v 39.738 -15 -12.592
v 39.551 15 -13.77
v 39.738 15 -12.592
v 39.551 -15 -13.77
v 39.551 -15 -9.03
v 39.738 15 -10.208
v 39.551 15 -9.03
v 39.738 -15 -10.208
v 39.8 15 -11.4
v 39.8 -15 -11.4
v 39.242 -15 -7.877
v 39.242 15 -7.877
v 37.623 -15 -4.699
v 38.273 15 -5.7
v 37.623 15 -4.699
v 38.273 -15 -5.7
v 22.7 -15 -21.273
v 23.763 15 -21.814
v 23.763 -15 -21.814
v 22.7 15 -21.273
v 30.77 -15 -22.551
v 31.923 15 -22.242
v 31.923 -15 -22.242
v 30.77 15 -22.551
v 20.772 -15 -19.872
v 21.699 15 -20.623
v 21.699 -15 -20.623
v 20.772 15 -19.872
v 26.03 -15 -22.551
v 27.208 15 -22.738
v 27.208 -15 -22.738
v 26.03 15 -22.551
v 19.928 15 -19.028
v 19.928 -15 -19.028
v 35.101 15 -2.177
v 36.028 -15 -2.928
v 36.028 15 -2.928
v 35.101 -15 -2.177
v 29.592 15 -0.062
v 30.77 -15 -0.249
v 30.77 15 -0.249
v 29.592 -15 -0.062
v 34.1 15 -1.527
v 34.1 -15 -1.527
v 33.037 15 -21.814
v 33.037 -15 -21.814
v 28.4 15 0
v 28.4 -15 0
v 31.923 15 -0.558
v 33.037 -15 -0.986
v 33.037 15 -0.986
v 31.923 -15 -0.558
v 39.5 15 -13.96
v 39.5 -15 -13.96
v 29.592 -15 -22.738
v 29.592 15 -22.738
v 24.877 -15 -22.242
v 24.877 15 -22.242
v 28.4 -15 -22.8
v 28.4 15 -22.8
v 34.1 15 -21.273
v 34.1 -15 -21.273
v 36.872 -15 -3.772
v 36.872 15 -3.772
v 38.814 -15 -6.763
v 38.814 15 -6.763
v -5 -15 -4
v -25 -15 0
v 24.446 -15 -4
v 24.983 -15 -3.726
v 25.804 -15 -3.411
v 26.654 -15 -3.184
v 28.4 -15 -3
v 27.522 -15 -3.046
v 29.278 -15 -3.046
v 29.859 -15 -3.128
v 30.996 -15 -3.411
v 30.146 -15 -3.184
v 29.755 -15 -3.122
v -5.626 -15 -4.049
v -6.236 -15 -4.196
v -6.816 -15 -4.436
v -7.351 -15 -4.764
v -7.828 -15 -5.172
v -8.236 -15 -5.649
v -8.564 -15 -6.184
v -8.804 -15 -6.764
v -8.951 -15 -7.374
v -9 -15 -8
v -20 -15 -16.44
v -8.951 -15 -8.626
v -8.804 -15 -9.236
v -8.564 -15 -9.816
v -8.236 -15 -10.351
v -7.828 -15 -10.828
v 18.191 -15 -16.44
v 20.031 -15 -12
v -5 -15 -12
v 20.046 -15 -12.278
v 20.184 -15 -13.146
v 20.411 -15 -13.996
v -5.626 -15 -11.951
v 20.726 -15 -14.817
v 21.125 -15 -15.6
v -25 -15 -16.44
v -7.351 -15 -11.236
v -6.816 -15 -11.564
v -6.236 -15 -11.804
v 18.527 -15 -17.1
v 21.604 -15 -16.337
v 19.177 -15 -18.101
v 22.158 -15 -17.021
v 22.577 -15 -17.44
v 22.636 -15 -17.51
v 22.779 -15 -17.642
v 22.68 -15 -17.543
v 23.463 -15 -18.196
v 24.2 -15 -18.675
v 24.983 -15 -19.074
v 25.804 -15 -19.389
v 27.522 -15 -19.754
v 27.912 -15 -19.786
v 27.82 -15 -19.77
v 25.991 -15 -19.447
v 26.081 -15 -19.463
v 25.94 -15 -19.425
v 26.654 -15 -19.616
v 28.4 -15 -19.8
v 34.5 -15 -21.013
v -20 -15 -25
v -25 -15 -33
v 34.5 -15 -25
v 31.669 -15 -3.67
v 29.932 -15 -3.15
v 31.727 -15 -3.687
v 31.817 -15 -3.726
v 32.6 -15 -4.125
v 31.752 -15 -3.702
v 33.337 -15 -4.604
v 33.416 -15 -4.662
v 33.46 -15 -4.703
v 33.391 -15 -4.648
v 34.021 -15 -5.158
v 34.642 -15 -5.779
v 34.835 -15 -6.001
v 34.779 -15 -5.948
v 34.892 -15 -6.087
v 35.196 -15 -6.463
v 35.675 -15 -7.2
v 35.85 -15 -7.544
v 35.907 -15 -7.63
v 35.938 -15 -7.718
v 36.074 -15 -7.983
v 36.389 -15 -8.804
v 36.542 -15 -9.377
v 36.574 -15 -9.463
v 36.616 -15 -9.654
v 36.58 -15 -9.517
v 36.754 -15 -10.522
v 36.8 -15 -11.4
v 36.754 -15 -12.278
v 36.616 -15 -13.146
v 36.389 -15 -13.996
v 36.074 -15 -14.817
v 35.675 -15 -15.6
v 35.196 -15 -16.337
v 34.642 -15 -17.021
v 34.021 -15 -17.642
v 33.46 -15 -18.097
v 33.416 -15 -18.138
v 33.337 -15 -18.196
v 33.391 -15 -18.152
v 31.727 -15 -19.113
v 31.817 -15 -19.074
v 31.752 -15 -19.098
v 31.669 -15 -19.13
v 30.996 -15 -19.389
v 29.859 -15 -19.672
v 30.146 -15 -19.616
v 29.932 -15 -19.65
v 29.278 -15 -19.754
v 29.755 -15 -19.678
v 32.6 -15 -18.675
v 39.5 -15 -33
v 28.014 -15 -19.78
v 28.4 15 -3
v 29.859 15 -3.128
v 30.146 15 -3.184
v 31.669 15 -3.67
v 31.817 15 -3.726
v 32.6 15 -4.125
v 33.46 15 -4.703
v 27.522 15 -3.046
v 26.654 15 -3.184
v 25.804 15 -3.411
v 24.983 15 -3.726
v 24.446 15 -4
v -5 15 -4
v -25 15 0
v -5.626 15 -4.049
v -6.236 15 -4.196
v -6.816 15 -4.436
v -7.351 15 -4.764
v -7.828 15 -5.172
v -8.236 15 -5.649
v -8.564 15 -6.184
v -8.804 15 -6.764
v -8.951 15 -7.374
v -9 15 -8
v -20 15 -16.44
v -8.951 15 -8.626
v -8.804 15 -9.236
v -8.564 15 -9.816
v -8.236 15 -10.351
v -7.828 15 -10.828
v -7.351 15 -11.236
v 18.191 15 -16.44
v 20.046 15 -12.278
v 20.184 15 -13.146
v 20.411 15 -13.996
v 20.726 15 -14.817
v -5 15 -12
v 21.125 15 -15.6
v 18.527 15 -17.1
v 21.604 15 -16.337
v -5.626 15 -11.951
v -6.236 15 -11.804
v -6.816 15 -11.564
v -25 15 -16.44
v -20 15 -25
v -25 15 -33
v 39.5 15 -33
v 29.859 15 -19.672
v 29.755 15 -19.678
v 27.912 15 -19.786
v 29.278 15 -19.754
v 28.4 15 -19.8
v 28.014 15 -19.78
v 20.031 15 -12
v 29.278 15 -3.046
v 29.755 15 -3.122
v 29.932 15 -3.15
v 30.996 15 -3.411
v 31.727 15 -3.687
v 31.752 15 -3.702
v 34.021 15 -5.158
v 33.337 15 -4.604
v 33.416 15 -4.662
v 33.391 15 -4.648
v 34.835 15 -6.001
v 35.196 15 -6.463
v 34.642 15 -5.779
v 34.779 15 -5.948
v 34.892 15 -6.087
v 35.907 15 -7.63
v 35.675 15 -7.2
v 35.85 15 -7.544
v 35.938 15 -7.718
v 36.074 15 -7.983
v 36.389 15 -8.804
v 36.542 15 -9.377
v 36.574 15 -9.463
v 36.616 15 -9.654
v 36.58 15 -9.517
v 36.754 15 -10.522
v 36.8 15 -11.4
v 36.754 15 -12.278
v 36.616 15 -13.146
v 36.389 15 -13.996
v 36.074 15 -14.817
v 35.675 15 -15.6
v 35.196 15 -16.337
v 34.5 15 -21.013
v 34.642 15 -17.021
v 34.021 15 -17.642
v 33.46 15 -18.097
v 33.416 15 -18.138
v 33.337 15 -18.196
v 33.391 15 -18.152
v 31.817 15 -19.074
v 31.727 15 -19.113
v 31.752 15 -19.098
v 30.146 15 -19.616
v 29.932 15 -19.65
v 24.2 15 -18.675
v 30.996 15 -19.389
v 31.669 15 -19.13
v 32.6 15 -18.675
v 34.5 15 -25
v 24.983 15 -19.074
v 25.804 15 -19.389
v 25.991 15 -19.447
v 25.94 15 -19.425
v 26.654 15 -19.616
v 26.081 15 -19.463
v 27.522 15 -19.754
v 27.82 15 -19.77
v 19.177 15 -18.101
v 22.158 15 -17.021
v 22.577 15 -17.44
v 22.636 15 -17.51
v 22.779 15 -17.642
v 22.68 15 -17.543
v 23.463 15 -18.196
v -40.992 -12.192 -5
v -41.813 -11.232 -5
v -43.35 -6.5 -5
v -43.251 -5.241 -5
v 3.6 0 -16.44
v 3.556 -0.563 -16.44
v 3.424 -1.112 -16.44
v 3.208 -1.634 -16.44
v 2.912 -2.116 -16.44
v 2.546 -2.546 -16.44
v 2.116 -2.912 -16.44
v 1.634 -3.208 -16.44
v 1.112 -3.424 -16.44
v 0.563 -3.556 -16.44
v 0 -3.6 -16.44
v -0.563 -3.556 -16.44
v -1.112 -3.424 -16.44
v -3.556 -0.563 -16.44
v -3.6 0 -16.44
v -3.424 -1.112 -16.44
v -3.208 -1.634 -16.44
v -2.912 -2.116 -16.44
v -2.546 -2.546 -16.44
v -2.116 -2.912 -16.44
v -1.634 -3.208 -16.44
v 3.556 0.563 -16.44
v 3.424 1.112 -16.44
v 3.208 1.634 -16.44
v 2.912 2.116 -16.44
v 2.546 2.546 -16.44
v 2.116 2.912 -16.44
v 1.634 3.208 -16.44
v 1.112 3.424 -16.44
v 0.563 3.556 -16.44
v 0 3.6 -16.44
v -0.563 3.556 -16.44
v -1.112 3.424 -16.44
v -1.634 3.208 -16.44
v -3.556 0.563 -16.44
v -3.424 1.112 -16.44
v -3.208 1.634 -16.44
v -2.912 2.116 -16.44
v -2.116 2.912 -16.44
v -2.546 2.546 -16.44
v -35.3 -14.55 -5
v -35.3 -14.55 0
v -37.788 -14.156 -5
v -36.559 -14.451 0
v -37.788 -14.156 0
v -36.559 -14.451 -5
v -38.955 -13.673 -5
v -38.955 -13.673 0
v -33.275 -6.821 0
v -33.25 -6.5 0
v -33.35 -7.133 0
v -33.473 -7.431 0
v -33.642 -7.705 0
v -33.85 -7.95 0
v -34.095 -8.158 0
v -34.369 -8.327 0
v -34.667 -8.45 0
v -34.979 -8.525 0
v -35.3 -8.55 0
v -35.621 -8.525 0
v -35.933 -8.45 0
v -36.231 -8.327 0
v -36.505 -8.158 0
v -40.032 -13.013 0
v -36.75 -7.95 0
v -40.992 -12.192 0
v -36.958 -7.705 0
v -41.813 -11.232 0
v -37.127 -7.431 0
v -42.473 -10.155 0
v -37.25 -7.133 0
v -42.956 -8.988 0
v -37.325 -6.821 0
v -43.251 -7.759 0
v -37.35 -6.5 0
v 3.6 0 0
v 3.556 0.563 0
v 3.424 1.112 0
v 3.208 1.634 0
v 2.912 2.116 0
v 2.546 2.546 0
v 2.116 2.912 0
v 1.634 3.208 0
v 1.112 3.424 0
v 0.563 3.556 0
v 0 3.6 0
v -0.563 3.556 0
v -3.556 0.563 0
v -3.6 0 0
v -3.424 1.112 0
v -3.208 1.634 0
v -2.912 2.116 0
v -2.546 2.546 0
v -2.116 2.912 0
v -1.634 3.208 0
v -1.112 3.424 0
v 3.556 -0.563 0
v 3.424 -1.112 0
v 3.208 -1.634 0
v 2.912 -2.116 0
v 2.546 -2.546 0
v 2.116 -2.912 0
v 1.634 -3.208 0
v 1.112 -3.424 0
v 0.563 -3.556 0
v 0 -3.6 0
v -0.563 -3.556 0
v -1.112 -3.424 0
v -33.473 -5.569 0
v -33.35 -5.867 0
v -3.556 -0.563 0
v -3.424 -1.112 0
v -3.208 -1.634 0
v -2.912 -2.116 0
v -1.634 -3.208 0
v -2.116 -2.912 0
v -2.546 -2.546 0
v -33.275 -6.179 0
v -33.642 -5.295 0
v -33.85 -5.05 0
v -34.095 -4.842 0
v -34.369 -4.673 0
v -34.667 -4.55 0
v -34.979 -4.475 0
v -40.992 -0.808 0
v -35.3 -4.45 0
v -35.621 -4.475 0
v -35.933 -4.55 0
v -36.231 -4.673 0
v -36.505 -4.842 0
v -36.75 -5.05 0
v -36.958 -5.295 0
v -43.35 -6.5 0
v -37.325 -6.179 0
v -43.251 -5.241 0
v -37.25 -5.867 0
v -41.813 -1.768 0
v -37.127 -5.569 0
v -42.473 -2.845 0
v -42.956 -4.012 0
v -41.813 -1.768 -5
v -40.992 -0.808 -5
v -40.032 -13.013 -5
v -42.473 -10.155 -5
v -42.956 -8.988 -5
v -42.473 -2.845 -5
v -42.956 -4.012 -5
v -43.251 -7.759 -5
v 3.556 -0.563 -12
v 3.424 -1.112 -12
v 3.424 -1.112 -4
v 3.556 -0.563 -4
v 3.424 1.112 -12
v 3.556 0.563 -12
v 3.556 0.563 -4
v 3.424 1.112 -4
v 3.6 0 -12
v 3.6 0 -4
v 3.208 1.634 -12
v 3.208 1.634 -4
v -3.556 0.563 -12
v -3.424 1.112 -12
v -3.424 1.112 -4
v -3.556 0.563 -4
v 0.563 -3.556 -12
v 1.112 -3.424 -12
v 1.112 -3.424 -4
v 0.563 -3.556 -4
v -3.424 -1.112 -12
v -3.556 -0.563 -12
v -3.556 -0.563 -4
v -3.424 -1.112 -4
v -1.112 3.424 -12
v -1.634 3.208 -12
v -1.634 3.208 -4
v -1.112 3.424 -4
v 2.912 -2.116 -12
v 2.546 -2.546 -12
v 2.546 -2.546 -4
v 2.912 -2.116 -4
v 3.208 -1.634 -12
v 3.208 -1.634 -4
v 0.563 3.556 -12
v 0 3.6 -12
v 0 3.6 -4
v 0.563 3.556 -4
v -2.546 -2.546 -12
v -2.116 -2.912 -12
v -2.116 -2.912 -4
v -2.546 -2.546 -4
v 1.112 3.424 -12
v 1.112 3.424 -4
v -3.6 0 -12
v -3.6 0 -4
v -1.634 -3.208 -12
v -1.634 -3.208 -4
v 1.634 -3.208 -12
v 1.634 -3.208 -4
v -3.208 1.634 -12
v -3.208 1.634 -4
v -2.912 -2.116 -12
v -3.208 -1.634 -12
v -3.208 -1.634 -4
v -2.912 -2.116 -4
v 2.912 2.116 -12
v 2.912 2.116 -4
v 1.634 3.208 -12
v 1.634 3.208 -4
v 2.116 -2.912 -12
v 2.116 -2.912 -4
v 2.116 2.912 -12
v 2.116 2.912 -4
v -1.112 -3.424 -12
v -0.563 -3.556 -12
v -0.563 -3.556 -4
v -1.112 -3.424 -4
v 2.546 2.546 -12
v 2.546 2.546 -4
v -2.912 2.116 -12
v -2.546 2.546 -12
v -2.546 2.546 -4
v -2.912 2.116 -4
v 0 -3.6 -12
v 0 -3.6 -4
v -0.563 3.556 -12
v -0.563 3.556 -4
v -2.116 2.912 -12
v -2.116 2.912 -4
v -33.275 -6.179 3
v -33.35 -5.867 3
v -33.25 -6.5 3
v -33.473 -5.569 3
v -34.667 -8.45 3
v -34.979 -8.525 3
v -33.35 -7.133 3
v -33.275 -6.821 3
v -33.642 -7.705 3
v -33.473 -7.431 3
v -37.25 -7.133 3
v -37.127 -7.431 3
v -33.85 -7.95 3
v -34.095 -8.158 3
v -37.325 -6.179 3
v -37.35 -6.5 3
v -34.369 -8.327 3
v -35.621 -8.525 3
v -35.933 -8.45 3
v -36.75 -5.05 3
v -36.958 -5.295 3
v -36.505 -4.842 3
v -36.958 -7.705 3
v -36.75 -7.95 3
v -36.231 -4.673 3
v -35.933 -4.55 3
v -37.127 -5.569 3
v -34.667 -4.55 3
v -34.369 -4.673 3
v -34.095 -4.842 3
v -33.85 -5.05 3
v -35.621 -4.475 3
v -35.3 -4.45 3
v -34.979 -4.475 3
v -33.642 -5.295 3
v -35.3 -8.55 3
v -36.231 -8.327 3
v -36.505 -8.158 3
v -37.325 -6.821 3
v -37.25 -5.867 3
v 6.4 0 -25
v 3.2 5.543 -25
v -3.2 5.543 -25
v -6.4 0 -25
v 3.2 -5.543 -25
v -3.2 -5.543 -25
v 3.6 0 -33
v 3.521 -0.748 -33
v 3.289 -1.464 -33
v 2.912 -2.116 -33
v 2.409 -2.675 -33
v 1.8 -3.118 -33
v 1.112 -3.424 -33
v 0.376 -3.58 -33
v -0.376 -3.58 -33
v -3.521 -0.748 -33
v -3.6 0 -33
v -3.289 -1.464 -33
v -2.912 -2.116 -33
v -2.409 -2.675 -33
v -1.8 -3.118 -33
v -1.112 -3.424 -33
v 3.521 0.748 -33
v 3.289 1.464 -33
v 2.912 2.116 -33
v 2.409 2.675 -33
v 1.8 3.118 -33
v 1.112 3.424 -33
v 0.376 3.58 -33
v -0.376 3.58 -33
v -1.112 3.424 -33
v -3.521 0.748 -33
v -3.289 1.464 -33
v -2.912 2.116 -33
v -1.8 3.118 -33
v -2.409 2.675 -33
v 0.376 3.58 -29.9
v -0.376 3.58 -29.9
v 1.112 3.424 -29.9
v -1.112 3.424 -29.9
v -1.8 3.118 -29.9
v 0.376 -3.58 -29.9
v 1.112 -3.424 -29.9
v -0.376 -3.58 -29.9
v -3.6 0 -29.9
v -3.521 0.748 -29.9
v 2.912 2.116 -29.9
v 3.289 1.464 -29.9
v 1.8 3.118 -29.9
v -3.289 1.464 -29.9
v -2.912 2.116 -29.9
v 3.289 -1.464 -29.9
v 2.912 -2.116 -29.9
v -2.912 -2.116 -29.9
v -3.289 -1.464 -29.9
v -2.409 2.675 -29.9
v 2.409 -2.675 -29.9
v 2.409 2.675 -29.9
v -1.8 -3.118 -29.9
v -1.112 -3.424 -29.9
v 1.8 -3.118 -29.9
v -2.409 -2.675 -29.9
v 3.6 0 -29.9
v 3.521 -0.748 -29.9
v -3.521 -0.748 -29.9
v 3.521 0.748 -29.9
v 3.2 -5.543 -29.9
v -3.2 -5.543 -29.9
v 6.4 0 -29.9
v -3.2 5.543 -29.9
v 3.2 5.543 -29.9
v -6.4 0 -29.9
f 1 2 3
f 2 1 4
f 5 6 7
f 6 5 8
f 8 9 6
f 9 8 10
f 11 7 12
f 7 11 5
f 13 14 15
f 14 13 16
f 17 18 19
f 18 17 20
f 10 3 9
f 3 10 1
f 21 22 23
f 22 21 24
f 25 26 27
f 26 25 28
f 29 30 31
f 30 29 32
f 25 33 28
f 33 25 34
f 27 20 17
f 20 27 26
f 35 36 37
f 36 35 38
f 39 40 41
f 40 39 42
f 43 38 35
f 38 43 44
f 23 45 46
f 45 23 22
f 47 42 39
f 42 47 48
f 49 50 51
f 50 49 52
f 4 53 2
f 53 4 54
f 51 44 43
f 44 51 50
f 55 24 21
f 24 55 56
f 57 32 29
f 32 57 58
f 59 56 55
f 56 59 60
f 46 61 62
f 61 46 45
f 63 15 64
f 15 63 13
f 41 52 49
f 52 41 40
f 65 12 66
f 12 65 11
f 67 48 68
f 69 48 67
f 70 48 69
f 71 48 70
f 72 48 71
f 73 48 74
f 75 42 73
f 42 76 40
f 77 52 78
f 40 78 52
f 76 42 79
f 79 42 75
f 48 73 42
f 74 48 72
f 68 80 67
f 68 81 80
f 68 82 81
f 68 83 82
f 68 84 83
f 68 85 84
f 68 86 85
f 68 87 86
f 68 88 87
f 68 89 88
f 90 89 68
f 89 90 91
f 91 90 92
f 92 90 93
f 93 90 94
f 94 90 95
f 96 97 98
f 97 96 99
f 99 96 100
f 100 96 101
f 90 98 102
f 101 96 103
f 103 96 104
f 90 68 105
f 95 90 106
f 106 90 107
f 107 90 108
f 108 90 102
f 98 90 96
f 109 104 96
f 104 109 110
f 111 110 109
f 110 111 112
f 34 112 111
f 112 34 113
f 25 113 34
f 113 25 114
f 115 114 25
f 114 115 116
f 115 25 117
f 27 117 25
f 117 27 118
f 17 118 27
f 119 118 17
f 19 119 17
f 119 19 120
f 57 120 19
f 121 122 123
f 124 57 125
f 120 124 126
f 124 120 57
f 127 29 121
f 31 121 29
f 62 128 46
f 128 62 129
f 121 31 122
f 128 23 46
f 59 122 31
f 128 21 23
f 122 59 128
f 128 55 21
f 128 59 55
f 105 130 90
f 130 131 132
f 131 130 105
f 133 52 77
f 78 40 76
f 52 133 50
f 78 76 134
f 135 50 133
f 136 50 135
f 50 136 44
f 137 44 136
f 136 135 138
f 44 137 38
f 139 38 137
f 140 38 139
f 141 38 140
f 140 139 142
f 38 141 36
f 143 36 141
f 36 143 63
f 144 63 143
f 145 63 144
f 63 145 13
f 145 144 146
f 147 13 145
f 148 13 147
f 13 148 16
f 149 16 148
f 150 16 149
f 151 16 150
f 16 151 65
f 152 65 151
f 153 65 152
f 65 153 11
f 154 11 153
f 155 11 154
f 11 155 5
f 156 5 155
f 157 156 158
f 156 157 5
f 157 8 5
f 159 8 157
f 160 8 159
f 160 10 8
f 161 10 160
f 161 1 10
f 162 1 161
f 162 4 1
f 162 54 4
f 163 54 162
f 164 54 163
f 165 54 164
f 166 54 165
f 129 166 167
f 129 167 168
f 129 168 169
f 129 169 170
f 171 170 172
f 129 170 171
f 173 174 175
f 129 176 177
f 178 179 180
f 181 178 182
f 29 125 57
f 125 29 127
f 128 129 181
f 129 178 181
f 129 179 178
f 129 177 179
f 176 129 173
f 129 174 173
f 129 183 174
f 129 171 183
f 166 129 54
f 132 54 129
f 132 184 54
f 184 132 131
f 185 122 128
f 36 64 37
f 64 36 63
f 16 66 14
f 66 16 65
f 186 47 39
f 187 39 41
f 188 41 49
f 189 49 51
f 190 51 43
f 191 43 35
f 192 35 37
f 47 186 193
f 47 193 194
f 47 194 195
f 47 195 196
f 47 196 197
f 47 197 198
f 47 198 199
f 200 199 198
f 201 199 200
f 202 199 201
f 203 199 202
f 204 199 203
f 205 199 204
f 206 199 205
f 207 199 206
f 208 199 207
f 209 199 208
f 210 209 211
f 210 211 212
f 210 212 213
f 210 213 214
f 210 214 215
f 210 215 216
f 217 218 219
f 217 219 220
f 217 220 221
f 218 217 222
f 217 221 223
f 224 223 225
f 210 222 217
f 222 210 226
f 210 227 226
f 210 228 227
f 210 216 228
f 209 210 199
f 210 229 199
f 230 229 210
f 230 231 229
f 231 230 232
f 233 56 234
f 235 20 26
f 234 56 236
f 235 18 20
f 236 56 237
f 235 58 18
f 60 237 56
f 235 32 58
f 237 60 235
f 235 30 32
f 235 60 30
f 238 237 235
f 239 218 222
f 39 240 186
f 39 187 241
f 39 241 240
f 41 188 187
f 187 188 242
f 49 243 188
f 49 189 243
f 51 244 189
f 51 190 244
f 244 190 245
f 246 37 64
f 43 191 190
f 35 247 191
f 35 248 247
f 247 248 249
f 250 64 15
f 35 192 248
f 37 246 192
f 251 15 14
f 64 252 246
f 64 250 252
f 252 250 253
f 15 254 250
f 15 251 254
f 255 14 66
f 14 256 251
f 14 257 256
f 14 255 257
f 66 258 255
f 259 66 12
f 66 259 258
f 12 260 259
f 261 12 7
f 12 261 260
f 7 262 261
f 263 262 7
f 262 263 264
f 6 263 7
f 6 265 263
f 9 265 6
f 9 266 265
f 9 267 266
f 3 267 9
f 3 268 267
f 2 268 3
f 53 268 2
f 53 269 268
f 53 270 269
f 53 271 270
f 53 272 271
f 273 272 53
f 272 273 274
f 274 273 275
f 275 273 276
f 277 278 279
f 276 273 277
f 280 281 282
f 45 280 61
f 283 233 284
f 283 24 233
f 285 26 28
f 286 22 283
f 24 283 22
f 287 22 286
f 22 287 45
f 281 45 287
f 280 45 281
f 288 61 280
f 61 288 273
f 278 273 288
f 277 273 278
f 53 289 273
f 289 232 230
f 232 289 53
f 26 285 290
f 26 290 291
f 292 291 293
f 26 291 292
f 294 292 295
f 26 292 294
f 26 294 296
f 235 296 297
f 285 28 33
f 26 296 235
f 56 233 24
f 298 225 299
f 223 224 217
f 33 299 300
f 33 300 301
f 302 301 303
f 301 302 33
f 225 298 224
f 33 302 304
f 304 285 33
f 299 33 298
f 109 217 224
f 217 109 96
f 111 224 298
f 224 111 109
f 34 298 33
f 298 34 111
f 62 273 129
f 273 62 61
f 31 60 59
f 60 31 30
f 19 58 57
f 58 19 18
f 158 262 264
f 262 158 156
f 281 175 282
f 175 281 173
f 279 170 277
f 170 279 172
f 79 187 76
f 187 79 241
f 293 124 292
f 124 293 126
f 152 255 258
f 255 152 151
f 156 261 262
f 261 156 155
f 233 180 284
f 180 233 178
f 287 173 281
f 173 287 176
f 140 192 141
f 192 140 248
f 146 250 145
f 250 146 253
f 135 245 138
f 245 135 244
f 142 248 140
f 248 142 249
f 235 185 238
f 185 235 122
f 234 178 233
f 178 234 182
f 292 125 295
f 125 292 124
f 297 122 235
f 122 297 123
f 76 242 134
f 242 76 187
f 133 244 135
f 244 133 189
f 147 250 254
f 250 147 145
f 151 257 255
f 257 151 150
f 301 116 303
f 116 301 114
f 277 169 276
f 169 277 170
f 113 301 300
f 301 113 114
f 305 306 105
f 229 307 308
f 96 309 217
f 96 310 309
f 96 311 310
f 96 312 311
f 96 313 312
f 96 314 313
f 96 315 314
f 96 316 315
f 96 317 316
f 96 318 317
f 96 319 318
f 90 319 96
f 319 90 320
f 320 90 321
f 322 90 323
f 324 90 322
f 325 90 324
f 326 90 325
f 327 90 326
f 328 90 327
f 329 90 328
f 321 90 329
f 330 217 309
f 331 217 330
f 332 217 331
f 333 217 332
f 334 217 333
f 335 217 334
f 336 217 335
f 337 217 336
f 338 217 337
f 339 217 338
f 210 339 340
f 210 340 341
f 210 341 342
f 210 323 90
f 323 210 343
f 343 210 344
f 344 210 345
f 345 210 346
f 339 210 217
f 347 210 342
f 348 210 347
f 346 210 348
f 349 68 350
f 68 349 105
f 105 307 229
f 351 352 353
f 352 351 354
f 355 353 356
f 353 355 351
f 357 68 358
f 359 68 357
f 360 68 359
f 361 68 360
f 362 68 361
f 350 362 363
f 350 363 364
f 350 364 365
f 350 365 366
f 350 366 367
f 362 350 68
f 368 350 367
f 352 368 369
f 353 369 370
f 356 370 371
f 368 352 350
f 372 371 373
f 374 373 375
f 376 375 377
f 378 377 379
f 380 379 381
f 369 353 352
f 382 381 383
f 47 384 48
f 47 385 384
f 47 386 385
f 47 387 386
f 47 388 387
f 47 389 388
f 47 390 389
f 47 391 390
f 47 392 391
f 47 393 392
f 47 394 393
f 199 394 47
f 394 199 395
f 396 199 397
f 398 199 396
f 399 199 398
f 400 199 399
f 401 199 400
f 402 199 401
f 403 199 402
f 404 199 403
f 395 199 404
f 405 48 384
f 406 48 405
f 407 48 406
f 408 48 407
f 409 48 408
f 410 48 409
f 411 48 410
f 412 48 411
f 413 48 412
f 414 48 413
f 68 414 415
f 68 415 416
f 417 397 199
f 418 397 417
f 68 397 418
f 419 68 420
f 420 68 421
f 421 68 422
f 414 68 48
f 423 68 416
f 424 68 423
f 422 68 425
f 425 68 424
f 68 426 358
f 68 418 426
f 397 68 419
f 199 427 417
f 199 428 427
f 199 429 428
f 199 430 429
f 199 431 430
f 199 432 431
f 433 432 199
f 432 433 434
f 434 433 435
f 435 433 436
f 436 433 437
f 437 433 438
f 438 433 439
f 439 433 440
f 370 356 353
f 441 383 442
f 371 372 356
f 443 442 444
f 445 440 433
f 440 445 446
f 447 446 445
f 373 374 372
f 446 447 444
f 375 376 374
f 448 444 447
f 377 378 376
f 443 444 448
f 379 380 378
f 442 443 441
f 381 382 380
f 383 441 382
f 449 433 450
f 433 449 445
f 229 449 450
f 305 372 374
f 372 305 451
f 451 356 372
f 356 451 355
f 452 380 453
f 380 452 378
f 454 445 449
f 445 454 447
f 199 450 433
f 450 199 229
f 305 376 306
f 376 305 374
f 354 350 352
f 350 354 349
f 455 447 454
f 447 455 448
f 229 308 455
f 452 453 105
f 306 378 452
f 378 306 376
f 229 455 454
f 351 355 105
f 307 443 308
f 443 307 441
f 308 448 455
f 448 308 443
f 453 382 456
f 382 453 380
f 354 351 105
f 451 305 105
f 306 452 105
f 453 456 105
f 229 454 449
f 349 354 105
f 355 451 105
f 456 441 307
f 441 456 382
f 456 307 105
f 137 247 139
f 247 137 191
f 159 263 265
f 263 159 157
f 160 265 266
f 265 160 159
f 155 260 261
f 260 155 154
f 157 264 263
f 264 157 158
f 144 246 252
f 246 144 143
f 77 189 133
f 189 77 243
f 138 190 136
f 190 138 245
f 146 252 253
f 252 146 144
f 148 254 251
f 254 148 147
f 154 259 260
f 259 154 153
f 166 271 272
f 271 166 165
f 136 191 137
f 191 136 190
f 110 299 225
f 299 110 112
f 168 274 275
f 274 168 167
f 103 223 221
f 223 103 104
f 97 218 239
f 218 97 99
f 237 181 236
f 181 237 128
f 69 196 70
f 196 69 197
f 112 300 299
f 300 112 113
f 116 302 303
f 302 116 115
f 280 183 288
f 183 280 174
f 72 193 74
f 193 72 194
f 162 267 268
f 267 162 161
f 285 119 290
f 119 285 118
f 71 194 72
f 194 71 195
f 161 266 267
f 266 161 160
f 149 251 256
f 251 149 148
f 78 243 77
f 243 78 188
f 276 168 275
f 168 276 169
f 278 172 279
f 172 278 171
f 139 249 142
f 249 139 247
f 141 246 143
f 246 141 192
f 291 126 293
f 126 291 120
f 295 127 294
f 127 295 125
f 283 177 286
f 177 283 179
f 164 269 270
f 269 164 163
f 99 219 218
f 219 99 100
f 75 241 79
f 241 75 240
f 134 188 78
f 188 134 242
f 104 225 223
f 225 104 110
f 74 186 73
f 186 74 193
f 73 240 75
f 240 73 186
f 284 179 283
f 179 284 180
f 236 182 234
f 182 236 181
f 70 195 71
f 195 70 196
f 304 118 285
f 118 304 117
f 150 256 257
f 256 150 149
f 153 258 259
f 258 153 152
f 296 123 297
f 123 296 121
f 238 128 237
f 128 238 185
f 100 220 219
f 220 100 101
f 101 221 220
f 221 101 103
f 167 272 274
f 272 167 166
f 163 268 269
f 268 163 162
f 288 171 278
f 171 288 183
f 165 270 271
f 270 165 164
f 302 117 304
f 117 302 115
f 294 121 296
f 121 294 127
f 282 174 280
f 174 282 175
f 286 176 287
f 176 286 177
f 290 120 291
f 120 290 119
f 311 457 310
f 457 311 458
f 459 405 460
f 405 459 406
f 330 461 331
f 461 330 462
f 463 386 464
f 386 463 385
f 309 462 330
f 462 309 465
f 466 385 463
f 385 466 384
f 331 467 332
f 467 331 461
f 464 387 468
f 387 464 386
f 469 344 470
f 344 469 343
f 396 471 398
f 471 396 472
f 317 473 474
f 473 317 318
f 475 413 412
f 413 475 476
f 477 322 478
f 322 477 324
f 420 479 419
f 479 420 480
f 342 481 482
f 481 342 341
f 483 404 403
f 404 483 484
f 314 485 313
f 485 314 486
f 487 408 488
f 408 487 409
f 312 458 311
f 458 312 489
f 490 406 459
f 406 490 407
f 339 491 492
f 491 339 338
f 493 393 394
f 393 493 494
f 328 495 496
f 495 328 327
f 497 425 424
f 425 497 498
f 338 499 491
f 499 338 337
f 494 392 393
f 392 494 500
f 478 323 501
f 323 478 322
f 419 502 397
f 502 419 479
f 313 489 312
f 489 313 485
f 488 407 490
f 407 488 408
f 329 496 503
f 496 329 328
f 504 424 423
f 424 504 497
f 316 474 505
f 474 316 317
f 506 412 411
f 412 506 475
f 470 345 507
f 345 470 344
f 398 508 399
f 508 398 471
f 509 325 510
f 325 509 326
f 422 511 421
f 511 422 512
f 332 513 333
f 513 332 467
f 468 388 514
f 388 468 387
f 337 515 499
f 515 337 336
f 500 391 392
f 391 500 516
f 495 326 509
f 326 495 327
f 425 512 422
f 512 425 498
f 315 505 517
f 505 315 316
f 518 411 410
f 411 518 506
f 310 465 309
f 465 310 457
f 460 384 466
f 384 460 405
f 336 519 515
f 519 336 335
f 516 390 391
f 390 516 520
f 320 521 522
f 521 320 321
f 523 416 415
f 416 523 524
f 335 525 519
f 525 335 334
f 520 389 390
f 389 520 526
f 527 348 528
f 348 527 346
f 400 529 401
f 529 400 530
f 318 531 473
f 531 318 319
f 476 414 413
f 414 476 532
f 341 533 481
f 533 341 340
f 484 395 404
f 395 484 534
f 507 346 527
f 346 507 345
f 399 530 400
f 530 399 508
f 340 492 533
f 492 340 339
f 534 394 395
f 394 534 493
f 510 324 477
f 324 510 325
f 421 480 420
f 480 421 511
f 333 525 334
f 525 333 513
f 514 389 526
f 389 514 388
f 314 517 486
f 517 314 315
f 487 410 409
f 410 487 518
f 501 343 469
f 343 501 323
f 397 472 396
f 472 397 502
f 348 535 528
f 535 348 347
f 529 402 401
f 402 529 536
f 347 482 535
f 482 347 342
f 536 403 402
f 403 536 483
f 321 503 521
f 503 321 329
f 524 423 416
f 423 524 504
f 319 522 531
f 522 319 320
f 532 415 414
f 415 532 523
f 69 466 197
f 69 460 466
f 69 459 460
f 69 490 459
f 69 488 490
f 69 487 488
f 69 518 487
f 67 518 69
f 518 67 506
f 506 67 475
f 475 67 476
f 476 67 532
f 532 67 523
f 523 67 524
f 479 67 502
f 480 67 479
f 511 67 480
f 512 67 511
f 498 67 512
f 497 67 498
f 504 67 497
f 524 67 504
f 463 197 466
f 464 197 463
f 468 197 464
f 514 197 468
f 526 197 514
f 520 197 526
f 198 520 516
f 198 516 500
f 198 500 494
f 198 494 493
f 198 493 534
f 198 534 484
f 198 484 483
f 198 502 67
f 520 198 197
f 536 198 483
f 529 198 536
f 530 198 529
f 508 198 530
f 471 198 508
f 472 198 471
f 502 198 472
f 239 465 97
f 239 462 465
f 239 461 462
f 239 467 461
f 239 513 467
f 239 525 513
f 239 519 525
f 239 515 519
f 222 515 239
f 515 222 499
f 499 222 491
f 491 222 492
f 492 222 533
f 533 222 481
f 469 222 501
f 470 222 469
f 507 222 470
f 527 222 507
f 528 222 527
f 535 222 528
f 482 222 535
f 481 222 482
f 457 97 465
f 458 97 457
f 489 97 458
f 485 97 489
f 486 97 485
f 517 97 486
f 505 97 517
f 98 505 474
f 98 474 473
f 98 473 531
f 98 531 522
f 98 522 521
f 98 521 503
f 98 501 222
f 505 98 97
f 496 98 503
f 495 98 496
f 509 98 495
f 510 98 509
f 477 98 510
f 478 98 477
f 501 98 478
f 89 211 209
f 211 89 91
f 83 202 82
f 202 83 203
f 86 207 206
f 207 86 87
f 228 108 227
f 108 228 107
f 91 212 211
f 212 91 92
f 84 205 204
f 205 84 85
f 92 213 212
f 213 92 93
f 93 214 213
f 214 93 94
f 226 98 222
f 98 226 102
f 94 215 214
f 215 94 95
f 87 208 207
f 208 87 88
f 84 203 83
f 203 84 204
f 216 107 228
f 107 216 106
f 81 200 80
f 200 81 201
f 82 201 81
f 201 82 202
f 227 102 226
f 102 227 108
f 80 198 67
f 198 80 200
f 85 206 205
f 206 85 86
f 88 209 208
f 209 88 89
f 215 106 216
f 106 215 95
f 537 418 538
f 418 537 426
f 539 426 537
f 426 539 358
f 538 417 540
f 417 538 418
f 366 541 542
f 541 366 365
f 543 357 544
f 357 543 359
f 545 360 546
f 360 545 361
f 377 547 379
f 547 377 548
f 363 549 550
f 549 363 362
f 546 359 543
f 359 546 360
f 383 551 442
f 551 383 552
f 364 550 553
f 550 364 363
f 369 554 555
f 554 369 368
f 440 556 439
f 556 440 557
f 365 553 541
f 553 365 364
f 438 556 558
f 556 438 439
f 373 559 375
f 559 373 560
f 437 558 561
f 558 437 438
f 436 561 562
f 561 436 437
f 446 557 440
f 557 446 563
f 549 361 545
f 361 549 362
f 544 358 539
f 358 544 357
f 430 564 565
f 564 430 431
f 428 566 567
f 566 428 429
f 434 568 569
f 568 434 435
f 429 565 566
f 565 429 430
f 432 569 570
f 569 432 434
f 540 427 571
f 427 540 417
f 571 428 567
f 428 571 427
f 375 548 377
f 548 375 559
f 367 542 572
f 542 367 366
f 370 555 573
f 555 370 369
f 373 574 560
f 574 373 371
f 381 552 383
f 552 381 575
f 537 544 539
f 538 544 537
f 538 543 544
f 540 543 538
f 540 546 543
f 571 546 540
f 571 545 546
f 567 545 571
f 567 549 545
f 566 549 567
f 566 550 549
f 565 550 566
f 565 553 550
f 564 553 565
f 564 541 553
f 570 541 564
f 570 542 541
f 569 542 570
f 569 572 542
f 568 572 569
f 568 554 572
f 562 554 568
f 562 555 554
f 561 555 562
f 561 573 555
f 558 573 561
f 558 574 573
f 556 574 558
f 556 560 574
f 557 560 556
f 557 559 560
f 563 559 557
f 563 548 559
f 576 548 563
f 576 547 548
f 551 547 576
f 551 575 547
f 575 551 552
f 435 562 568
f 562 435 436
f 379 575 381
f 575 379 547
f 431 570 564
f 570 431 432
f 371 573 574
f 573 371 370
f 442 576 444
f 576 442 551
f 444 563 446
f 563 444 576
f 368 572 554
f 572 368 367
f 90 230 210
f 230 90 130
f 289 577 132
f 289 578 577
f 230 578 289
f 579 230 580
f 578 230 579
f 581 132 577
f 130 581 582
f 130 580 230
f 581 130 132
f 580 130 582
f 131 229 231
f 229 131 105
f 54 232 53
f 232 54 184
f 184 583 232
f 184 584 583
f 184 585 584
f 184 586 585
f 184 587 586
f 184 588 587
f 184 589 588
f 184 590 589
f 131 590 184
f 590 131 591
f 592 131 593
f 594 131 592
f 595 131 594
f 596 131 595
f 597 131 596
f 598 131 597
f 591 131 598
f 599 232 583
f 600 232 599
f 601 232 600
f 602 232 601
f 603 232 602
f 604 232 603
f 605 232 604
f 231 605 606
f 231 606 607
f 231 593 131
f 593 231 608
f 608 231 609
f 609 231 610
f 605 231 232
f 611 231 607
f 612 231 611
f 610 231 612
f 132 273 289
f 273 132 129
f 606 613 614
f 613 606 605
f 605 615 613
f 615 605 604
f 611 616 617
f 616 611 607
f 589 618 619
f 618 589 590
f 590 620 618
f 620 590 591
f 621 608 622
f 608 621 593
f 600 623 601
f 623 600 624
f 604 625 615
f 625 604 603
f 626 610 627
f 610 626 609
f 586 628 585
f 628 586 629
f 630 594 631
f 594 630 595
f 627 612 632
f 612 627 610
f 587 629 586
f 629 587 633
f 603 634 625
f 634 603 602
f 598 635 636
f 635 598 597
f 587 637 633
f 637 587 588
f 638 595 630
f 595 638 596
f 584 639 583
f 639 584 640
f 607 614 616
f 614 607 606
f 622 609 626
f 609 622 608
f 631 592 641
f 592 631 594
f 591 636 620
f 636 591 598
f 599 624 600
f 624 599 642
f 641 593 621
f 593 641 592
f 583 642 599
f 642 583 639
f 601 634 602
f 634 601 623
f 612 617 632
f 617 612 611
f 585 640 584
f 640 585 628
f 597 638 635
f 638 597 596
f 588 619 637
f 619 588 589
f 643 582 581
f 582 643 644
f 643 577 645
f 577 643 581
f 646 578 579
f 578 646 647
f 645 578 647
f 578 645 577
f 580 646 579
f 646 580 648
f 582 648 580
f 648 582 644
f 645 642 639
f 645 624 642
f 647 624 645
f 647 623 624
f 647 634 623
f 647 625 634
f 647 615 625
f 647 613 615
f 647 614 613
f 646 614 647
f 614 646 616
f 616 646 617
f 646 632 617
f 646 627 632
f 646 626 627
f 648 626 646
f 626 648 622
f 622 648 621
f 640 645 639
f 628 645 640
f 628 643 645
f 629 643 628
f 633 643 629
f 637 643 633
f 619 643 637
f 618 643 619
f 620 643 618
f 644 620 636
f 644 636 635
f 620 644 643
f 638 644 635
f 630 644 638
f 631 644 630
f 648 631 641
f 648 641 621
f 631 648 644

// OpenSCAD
// file: knurledFinishLib_v2.scad
/*
 * knurledFinishLib_v2.scad
 * 
 * Written by aubenc @ Thingiverse
 *
 * This script is licensed under the Public Domain license.
 *
 * http://www.thingiverse.com/thing:31122
 *
 * Derived from knurledFinishLib.scad (also Public Domain license) available at
 *
 * http://www.thingiverse.com/thing:9095
 *
 * Usage:
 *
 *	 Drop this script somewhere where OpenSCAD can find it (your current project's
 *	 working directory/folder or your OpenSCAD libraries directory/folder).
 *
 *	 Add the line:
 *
 *		use <knurledFinishLib_v2.scad>
 *
 *	 in your OpenSCAD script and call either...
 *
 *    knurled_cyl( Knurled cylinder height,
 *                 Knurled cylinder outer diameter,
 *                 Knurl polyhedron width,
 *                 Knurl polyhedron height,
 *                 Knurl polyhedron depth,
 *                 Cylinder ends smoothed height,
 *                 Knurled surface smoothing amount );
 *
 *  ...or...
 *
 *    knurl();
 *
 *	If you use knurled_cyl() module, you need to specify the values for all and
 *
 *  Call the module ' help(); ' for a little bit more of detail
 *  and/or take a look to the PDF available at http://www.thingiverse.com/thing:9095
 *  for a in depth descrition of the knurl properties.
 */


module knurl(	k_cyl_hg	= 12,
					k_cyl_od	= 25,
					knurl_wd =  3,
					knurl_hg =  4,
					knurl_dp =  1.5,
					e_smooth =  2,
					s_smooth =  0)
{
    knurled_cyl(k_cyl_hg, k_cyl_od, 
                knurl_wd, knurl_hg, knurl_dp, 
                e_smooth, s_smooth);
}

module knurled_cyl(chg, cod, cwd, csh, cdp, fsh, smt)
{
    cord=(cod+cdp+cdp*smt/100)/2;
    cird=cord-cdp;
    cfn=round(2*cird*PI/cwd);
    clf=360/cfn;
    crn=ceil(chg/csh);

    echo("knurled cylinder max diameter: ", 2*cord);
    echo("knurled cylinder min diameter: ", 2*cird);

	 if( fsh < 0 )
    {
        union()
        {
            shape(fsh, cird+cdp*smt/100, cord, cfn*4, chg);

            translate([0,0,-(crn*csh-chg)/2])
              knurled_finish(cord, cird, clf, csh, cfn, crn);
        }
    }
    else if ( fsh == 0 )
    {
        intersection()
        {
            cylinder(h=chg, r=cord-cdp*smt/100, $fn=2*cfn, center=false);

            translate([0,0,-(crn*csh-chg)/2])
              knurled_finish(cord, cird, clf, csh, cfn, crn);
        }
    }
    else
    {
        intersection()
        {
            shape(fsh, cird, cord-cdp*smt/100, cfn*4, chg);

            translate([0,0,-(crn*csh-chg)/2])
              knurled_finish(cord, cird, clf, csh, cfn, crn);
        }
    }
}

module shape(hsh, ird, ord, fn4, hg)
{
	x0= 0;	x1 = hsh > 0 ? ird : ord;		x2 = hsh > 0 ? ord : ird;
	y0=-0.1;	y1=0;	y2=abs(hsh);	y3=hg-abs(hsh);	y4=hg;	y5=hg+0.1;

	if ( hsh >= 0 )
	{
		rotate_extrude(convexity=10, $fn=fn4)
		polygon(points=[	[x0,y1],[x1,y1],[x2,y2],[x2,y3],[x1,y4],[x0,y4]	],
					paths=[	[0,1,2,3,4,5]	]);
	}
	else
	{
		rotate_extrude(convexity=10, $fn=fn4)
		polygon(points=[	[x0,y0],[x1,y0],[x1,y1],[x2,y2],
								[x2,y3],[x1,y4],[x1,y5],[x0,y5]	],
					paths=[	[0,1,2,3,4,5,6,7]	]);
	}
}

module knurled_finish(ord, ird, lf, sh, fn, rn)
{
    for(j=[0:rn-1])
    assign(h0=sh*j, h1=sh*(j+1/2), h2=sh*(j+1))
    {
        for(i=[0:fn-1])
        assign(lf0=lf*i, lf1=lf*(i+1/2), lf2=lf*(i+1))
        {
            polyhedron(
                points=[
                     [ 0,0,h0],
                     [ ord*cos(lf0), ord*sin(lf0), h0],
                     [ ird*cos(lf1), ird*sin(lf1), h0],
                     [ ord*cos(lf2), ord*sin(lf2), h0],

                     [ ird*cos(lf0), ird*sin(lf0), h1],
                     [ ord*cos(lf1), ord*sin(lf1), h1],
                     [ ird*cos(lf2), ird*sin(lf2), h1],

                     [ 0,0,h2],
                     [ ord*cos(lf0), ord*sin(lf0), h2],
                     [ ird*cos(lf1), ird*sin(lf1), h2],
                     [ ord*cos(lf2), ord*sin(lf2), h2]
                    ],
                triangles=[
                     [0,1,2],[2,3,0],
                     [1,0,4],[4,0,7],[7,8,4],
                     [8,7,9],[10,9,7],
                     [10,7,6],[6,7,0],[3,6,0],
                     [2,1,4],[3,2,6],[10,6,9],[8,9,4],
                     [4,5,2],[2,5,6],[6,5,9],[9,5,4]
                    ],
                convexity=5);
         }
    }
}

module knurl_help()
{
	echo();
	echo("    Knurled Surface Library  v2  ");
   echo("");
	echo("      Modules:    ");
	echo("");
	echo("        knurled_cyl(parameters... );    -    Requires a value for each an every expected parameter (see bellow)    ");
	echo("");
	echo("        knurl();    -    Call to the previous module with a set of default parameters,    ");
	echo("                                  values may be changed by adding 'parameter_name=value'        i.e.     knurl(s_smooth=40);    ");
	echo("");
	echo("      Parameters, all of them in mm but the last one.    ");
	echo("");
	echo("        k_cyl_hg       -   [ 12   ]  ,,  Height for the knurled cylinder    ");
	echo("        k_cyl_od      -   [ 25   ]  ,,  Cylinder's Outer Diameter before applying the knurled surfacefinishing.    ");
	echo("        knurl_wd     -   [   3   ]  ,,  Knurl's Width.    ");
	echo("        knurl_hg      -   [   4   ]  ,,  Knurl's Height.    ");
	echo("        knurl_dp     -   [  1.5 ]  ,,  Knurl's Depth.    ");
	echo("        e_smooth   -    [  2   ]  ,,  Bevel's Height at the bottom and the top of the cylinder    ");
	echo("        s_smooth   -    [  0   ]  ,,  Knurl's Surface Smoothing :  File donwn the top of the knurl this value, i.e. 40 will snooth it a 40%.    ");
	echo("");
}
// file: cameraKnob.scad
use <knurledFinishLib_v2.scad>;

module knob(){
difference() { 
	union(){
		knurl(k_cyl_hg	= 8,	k_cyl_od	= 34.5);
		//cylinder (h = 8, r= 18);
		cylinder (h = 8.5, r = 10, $fn = 30);
	}
	cylinder (h = 20, r = 3, center = true, $fn = 30);
	translate ([0, 0, 4]) rotate (a = [0, 90, 0]) cylinder (h = 40, r = 1, $fn = 30); 
	translate ([10, 0, 4]) rotate (a = [0, 90, 0]) cylinder (h = 40, r = 2.5, $fn = 30); 
}
}
// file: base.scad
pin_x=-35.3;
pin_y = -6.5;
bolt_r = 7.2/2;
pin_r = 4.1/2;
pin_h = 6;

wall_thickness = 3;
bar_r = 8.4;
width = 30;
gap=8;


bar_offset_x = 20 + bar_r;
bar_offset_z = -1 *(bar_r + wall_thickness);
main_thickness = wall_thickness + bar_r * 1.6;

pin_plate_thickness = 5;

module base(){
	union(){
		difference(){
			bar_holder();
			cylinder(r=bolt_r,100,center=true,$fn=40);
			translate([-5,-20,-12])cube([bar_offset_x + 5,40,gap]);
			translate([-5,0,-12+gap/2])rotate([90,0,0])cylinder(r=gap/2,h=40,center=true,$fn=40);
			
		}
		translate([pin_x,pin_y,0])cylinder(r=pin_r,pin_h,center=true,$fn=40);
	}
}

module bar_holder(){
	difference(){
		union(){
			translate([bar_offset_x,0,bar_offset_z])rotate([90,0,0])tube(ir=bar_r,h=width,or=bar_r + wall_thickness);
			hull(){
				translate([0,width/-2,-1*main_thickness])cube([bar_offset_x,width,main_thickness]);
				translate([-25,width/-2,-1*main_thickness])cube([bar_offset_x,width,main_thickness]);
				translate([pin_x,pin_y,-1*pin_plate_thickness])cylinder(r=pin_r+2*wall_thickness,pin_plate_thickness,$fn=40);
				translate([pin_x/3,0,-0.5*main_thickness])cylinder(r=width/2,main_thickness/2,$fn=40);
			}
		}
		translate([bar_offset_x,0,bar_offset_z])rotate([90,0,0])cylinder(r=bar_r,h=100,center=true,$fn=60);
	}
}

module tube(or,ir,h){
	difference(){
		cylinder(r=or,h=h,center=true,$fn=60);
		cylinder(r=ir,h=h+2,center=true);
	}
}

base();
// main file
use <base.scad>;
use <cameraKnob.scad>;
pin_x=-35.3;
pin_y = -6.5;
bolt_r = 7.2/2;
pin_r = 4.1/2;
pin_h = 6;

wall_thickness = 3;
bar_r = 8.4;
width = 30;
gap=8;


bar_offset_x = 20 + bar_r;
bar_offset_z = -1 *(bar_r + wall_thickness);
main_thickness = wall_thickness + bar_r * 1.6;

pin_plate_thickness = 5;

base();

module nut(){
	cylinder (h = 5, r=6.4, $fn=6);
}

difference() { 
	union(){
		translate ([-25, width * -0.5, -25]) cube (size = [5, width, 10]) ;
		translate ([-25, width * -0.5, -33]) cube (size = [64.5, width, 8]) ;
		translate ([34.5, width * -0.5, -25]) cube (size = [5, width, 15]) ;
	}
	translate([bar_offset_x,0,bar_offset_z])rotate([90,0,0])cylinder(r=bar_r,h=100,center=true,$fn=60);
	rotate (a = [0, 180, 0]) cylinder(r=bolt_r,h=100,$fn=30);
	translate ([0, 0, -29.9]) nut();
}

//translate ([0, 0, -17]) rotate (a = [180, 0, 0]) cylinder (h = 8, r= width/2+3);
